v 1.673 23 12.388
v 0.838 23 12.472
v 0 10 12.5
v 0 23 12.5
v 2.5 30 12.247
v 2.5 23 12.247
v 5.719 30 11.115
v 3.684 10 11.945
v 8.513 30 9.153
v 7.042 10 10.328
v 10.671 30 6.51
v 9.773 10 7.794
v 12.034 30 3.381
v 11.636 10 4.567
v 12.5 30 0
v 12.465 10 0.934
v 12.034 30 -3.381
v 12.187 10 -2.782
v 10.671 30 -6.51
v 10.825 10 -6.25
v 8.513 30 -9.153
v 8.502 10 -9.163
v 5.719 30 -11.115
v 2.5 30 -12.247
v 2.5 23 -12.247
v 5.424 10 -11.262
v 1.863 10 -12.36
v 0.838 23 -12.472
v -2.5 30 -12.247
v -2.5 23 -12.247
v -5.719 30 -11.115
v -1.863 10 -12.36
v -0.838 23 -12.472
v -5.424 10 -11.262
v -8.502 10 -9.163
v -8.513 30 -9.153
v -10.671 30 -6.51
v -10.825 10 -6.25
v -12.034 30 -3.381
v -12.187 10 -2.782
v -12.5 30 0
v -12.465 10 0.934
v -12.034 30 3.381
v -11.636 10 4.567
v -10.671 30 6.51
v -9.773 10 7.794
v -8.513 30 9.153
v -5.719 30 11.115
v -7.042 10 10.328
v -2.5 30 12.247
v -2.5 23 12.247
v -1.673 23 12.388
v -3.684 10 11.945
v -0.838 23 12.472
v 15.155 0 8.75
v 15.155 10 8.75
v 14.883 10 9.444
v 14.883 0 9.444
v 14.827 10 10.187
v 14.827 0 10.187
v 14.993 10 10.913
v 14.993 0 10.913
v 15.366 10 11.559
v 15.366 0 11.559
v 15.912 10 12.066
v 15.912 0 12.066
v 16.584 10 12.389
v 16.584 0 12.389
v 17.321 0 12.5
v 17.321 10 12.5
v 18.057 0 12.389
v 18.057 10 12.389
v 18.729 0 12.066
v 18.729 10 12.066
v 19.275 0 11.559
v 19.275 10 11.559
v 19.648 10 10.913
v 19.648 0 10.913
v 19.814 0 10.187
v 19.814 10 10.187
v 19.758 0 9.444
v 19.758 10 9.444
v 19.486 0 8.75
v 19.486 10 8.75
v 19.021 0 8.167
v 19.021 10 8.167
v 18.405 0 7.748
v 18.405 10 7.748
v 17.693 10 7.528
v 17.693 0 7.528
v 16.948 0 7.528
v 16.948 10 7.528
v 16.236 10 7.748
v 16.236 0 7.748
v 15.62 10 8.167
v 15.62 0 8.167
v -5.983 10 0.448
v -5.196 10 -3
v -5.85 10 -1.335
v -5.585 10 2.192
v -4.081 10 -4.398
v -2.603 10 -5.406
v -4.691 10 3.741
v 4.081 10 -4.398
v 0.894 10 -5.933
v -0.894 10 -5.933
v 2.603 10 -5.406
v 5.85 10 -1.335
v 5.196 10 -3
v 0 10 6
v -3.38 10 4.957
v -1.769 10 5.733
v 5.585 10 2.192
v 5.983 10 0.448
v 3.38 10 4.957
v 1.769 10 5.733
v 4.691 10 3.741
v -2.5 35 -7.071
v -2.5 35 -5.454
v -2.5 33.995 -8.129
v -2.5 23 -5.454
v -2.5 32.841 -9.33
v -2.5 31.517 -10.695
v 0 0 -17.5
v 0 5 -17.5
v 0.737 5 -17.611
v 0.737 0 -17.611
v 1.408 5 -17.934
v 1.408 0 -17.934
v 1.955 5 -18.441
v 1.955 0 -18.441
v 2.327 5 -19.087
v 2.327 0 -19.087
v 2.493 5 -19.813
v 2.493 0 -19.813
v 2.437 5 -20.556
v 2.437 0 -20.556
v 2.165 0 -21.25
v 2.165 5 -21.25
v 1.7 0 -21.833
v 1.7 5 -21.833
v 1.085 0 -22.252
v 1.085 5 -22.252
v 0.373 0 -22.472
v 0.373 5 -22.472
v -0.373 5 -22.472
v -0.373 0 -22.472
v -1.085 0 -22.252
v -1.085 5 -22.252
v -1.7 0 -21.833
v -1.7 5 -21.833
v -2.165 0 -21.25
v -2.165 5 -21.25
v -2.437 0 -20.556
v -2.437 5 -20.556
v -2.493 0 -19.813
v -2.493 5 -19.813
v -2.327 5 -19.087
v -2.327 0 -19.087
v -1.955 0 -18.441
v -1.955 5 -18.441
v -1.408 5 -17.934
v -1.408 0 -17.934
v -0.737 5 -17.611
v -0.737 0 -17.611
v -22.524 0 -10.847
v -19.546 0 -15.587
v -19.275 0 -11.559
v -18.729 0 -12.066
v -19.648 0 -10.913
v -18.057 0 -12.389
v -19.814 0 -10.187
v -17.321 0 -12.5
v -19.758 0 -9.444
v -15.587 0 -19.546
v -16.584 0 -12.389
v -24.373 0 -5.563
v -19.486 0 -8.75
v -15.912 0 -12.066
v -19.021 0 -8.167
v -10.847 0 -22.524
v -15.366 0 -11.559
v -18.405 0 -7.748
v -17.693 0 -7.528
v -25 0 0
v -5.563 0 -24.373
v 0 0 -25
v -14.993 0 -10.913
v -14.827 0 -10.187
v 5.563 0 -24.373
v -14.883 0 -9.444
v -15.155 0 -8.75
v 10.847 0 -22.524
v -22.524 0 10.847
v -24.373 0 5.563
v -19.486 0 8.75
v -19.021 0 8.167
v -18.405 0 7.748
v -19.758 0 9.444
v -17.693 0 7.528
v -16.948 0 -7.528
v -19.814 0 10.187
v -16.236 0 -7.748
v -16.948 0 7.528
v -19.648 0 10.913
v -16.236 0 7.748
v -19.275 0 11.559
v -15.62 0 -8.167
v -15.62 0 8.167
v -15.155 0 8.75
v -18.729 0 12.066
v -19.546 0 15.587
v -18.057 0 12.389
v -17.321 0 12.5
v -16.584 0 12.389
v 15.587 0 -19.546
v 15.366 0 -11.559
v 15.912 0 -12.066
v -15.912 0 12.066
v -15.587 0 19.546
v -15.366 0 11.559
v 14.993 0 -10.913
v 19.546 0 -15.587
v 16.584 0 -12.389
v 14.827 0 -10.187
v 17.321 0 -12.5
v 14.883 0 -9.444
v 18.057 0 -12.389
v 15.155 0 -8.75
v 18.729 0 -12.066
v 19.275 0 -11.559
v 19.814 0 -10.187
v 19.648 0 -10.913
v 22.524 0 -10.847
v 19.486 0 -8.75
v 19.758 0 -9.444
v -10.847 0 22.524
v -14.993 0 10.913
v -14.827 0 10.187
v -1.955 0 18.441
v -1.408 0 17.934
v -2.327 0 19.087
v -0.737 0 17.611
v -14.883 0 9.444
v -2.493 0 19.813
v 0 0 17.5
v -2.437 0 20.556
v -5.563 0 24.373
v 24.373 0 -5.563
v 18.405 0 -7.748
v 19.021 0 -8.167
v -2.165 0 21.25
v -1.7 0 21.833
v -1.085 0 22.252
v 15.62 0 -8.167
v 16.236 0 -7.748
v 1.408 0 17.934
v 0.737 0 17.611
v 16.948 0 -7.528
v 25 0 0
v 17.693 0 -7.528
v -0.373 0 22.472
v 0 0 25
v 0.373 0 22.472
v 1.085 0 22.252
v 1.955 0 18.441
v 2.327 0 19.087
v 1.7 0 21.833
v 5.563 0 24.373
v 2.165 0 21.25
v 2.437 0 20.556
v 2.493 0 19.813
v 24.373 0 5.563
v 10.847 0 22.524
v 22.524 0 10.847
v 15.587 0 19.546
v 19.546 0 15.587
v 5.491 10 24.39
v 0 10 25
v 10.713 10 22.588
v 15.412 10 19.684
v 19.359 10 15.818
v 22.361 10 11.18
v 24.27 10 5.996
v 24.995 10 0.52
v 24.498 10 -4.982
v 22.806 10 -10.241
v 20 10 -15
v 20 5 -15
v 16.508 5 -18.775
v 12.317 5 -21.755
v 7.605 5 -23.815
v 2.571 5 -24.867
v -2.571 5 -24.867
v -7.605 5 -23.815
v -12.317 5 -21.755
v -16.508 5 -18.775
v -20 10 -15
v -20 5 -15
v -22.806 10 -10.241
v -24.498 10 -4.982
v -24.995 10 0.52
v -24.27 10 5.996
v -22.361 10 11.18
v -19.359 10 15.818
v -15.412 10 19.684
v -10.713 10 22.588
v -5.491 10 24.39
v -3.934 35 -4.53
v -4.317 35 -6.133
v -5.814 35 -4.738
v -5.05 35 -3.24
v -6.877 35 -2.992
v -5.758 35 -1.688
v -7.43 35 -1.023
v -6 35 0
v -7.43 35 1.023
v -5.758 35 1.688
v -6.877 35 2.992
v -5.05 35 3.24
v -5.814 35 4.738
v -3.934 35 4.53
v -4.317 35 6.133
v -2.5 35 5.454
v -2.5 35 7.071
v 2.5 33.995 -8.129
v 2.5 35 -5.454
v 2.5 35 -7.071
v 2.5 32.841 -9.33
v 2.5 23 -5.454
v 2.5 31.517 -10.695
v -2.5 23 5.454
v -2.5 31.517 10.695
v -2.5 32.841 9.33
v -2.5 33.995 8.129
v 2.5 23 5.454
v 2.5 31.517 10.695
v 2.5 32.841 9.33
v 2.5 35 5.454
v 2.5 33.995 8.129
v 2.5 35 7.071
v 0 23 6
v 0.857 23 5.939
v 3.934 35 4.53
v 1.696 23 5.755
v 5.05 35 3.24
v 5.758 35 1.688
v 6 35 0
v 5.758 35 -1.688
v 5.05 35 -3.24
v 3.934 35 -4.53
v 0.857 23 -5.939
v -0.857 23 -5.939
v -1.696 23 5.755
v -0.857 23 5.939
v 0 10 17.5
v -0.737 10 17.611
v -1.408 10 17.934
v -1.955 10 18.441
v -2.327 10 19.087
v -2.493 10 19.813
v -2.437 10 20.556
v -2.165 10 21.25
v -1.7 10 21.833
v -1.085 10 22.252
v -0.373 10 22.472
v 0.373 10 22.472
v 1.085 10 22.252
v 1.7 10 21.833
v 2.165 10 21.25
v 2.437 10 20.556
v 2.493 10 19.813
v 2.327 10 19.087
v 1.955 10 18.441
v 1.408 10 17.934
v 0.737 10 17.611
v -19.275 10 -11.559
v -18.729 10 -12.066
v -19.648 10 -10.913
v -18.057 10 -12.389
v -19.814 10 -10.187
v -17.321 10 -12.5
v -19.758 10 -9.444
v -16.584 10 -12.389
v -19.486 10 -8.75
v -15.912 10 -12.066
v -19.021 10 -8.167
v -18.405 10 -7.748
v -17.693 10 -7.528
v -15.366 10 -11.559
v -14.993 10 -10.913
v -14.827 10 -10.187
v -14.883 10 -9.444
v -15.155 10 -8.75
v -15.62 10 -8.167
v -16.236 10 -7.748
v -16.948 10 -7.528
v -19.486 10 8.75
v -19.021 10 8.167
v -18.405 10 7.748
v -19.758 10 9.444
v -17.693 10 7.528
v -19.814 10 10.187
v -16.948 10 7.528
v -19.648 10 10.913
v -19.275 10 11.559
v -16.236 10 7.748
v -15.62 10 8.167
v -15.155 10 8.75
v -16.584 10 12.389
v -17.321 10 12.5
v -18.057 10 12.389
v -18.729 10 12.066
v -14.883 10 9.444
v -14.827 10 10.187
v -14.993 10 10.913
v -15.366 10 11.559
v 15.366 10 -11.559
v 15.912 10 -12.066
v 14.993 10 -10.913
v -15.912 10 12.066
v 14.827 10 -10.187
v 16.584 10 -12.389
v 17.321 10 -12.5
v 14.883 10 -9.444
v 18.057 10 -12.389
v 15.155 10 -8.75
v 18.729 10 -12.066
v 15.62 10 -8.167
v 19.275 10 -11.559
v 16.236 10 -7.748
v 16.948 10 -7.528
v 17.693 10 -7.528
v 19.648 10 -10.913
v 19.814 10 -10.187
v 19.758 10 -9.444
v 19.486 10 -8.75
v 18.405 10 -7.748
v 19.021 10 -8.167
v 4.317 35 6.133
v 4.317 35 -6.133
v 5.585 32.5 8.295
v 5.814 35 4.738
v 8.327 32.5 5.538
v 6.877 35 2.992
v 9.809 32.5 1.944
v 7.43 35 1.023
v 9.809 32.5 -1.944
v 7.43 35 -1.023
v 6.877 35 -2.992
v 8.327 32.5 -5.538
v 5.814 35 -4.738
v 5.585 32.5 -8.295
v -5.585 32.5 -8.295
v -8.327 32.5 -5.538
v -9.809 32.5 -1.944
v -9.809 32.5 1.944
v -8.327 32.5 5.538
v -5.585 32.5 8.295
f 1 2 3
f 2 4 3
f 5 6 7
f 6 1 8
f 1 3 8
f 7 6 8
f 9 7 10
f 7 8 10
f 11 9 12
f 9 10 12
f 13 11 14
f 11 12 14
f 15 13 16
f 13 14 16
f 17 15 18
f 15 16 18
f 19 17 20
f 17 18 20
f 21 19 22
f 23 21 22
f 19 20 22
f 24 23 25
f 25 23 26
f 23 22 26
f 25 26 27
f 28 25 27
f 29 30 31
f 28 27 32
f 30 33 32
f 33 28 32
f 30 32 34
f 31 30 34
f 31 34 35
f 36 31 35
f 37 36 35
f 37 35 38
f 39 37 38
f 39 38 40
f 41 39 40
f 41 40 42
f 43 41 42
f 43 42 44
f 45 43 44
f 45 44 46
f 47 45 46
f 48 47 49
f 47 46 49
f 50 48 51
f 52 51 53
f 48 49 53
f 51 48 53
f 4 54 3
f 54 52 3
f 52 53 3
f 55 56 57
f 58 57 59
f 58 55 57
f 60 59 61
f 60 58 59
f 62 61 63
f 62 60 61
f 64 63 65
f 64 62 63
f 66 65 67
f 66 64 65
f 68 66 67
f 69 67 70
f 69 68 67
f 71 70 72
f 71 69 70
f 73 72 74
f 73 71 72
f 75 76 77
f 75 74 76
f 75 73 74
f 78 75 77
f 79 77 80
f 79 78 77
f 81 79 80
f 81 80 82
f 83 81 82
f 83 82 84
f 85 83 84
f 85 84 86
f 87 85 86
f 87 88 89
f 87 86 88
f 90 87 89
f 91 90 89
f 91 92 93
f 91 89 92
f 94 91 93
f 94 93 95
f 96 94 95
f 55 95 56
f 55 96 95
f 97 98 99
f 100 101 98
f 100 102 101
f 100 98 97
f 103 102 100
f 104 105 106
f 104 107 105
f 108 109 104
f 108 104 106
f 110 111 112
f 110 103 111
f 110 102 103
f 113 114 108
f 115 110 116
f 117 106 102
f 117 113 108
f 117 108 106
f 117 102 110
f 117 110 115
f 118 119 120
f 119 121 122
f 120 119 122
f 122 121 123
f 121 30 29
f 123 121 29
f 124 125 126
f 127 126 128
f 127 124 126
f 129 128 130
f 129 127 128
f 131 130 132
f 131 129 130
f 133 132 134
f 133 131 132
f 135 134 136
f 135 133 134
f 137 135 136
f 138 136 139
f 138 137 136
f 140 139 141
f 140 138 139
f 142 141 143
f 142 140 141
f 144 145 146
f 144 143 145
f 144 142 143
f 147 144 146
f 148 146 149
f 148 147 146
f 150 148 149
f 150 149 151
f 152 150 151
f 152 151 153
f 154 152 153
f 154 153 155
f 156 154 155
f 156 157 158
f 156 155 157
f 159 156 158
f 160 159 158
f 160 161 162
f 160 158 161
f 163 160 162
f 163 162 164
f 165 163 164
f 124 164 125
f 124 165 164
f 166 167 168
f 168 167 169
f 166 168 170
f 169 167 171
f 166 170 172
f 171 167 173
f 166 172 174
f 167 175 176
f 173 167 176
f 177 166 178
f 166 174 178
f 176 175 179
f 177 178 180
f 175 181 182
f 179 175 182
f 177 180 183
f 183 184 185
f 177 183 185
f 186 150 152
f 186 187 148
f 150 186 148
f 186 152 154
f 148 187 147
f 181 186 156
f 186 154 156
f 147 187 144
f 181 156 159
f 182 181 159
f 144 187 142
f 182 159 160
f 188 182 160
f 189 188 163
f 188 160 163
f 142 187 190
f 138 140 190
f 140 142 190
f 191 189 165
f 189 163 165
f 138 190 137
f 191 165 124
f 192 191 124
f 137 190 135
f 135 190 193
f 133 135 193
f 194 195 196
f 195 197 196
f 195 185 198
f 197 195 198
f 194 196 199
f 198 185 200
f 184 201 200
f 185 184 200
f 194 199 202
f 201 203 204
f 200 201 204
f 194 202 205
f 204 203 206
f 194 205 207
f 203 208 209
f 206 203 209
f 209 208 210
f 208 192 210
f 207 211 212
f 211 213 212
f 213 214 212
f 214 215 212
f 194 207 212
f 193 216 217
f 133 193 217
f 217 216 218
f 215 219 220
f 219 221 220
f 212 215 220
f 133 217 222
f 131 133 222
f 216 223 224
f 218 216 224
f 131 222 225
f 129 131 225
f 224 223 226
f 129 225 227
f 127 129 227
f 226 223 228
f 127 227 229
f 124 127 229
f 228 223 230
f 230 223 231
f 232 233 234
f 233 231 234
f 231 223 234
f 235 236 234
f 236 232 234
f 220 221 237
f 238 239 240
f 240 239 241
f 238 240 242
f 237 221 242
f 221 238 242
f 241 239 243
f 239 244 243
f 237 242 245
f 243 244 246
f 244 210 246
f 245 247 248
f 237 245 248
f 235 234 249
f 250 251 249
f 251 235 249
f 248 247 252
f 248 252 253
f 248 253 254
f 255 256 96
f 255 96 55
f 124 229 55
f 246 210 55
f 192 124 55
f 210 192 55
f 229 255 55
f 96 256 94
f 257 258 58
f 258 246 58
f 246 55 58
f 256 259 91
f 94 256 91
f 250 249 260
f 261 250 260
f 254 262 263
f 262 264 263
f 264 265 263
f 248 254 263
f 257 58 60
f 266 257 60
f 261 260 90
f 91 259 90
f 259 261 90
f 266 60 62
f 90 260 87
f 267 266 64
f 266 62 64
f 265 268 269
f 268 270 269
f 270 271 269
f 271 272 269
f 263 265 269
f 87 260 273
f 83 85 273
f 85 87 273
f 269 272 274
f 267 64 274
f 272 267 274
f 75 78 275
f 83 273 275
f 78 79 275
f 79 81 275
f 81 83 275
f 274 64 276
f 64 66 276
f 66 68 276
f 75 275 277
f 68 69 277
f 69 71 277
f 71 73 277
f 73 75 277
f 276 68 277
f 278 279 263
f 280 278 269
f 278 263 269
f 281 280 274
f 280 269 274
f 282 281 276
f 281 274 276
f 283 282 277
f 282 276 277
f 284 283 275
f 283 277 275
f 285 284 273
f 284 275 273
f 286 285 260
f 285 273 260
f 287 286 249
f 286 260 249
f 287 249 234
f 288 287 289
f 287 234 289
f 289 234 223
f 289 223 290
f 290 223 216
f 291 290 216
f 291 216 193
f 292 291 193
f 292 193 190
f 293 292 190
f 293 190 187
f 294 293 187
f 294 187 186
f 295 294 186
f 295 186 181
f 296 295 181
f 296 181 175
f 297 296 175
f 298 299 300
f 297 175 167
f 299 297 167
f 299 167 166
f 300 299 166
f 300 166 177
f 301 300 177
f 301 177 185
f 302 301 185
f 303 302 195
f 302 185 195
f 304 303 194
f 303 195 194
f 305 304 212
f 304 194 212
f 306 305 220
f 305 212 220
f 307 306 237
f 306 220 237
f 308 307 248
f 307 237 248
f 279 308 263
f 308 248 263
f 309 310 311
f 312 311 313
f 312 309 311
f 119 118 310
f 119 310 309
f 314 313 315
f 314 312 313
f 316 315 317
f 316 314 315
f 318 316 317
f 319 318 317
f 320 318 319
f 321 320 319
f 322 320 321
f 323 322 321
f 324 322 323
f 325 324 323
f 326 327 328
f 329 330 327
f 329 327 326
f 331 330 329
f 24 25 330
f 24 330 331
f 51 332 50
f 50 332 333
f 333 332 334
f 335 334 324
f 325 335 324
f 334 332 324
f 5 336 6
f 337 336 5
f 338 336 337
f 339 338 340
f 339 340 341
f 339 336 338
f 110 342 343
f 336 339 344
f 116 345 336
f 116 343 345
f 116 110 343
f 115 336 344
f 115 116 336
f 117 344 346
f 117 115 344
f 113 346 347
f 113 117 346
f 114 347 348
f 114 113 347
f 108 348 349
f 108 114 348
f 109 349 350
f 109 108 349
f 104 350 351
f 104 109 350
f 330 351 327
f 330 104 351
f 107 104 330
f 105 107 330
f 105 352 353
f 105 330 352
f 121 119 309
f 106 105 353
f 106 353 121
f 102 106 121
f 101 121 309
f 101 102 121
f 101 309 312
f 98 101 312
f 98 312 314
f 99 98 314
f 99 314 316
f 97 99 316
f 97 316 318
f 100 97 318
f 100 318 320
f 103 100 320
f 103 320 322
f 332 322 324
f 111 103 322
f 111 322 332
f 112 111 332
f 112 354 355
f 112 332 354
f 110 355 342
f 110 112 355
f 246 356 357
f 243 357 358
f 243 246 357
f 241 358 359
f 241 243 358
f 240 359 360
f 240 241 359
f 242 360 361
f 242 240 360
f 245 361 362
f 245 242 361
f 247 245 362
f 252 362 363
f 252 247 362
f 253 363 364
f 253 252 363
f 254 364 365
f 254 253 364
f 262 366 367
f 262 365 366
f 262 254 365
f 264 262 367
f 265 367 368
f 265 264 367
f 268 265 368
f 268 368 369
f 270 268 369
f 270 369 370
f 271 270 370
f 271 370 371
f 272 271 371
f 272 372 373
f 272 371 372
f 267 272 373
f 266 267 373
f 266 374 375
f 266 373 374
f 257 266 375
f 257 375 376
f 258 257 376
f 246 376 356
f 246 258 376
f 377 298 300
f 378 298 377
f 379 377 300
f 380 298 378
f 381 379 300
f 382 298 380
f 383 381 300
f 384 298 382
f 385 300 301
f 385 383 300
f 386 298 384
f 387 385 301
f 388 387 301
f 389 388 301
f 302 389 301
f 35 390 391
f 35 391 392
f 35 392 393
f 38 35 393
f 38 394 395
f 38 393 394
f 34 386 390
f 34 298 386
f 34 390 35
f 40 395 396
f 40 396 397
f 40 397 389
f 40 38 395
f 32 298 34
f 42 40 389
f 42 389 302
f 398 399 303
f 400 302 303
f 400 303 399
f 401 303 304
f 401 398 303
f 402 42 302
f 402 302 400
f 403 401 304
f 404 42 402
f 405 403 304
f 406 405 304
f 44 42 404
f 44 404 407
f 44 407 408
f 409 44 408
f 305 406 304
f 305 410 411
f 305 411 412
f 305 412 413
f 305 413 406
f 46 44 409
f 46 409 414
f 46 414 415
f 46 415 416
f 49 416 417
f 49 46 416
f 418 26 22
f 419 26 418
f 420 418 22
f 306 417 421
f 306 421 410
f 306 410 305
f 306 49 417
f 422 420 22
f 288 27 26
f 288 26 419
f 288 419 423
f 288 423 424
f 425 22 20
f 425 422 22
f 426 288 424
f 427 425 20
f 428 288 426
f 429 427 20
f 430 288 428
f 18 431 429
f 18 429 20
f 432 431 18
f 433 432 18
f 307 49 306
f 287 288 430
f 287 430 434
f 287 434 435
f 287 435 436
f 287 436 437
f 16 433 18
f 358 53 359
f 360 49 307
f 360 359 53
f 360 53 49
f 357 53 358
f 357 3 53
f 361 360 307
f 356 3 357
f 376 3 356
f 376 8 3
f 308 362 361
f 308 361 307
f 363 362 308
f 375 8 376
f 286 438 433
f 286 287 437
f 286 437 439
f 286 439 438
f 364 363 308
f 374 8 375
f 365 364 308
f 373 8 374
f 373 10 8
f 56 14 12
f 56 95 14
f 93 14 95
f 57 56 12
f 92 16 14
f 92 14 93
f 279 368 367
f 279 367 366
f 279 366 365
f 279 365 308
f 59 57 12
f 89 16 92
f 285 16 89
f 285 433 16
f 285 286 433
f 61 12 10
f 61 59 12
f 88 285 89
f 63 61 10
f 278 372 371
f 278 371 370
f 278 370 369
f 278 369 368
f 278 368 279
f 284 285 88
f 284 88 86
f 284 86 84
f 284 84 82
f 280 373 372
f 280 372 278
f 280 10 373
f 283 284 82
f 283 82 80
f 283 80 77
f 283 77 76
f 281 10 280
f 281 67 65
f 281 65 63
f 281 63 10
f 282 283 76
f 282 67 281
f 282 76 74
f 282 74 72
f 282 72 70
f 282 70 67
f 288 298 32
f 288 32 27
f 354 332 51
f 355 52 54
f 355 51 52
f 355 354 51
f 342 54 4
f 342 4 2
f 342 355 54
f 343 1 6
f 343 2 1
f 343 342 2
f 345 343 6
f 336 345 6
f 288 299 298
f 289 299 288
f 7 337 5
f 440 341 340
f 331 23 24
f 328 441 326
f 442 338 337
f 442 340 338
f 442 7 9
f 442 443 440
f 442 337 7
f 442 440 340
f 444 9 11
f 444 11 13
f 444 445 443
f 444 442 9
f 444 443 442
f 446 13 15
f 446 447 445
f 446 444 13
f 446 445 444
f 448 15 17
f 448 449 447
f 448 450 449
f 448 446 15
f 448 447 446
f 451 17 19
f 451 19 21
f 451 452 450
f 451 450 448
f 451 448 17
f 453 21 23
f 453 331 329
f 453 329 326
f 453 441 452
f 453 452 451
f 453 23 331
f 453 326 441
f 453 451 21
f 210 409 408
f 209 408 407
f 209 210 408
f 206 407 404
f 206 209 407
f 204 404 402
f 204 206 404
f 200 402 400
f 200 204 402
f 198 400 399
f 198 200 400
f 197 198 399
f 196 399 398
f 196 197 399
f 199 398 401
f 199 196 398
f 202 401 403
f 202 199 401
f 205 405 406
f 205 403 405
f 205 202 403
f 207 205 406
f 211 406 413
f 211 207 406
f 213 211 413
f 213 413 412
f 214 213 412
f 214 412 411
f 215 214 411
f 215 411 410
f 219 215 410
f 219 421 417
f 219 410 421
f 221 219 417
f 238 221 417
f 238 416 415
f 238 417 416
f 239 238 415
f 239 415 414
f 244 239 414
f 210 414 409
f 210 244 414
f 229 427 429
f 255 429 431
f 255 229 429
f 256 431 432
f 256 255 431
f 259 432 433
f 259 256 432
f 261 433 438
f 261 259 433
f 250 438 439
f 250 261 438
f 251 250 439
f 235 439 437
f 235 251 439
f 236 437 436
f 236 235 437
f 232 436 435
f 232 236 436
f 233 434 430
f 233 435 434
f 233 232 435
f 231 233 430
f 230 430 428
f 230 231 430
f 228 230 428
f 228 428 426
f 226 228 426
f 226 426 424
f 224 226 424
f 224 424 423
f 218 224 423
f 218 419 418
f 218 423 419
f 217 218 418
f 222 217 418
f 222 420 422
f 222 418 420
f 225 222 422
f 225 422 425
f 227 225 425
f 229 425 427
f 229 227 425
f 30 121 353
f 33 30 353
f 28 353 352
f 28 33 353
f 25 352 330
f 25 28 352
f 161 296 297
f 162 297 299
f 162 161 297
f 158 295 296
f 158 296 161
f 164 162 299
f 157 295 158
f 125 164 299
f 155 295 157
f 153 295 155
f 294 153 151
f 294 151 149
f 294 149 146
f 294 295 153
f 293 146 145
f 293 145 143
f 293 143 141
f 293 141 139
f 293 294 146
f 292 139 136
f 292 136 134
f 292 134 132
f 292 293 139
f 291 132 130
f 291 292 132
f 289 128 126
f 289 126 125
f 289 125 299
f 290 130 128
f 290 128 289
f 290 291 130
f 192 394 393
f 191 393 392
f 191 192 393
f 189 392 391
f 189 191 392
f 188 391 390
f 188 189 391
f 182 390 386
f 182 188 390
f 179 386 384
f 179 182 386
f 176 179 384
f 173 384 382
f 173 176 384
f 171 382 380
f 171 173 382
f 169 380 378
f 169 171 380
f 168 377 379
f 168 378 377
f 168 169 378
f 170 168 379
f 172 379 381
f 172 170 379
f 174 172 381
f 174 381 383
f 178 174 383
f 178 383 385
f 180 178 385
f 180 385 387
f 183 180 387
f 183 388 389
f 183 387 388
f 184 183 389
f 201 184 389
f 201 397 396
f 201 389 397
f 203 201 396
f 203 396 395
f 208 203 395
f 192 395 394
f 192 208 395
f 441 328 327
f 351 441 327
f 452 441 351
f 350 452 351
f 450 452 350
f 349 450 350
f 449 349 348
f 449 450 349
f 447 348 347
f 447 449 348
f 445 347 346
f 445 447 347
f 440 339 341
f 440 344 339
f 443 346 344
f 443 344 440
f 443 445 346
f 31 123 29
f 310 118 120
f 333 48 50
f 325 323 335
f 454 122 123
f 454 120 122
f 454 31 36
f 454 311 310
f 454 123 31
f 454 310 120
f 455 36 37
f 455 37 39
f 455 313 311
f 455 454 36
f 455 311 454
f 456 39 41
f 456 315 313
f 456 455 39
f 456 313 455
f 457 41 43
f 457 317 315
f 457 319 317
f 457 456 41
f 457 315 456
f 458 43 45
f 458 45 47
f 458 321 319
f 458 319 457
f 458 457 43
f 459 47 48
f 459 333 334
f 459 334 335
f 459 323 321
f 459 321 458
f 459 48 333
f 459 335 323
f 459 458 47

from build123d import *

# Parameters (mm, degrees)
SKETCH1_R               = 25
BOSS_EXTRUDE1_DEPTH     = 10
SKETCH1_3_R             = 12.5
SKETCH1_3_R_2           = 6
BOSS_EXTRUDE2_DEPTH     = 35
CUT_EXTRUDE1_START      = 5
CUT_EXTRUDE1_DEPTH      = 5
CUT_EXTRUDE2_DEPTH      = 50.749371855
CUT_EXTRUDE2_DEPTH_BACK = 50.749371855
SKETCH2_W               = 5
SKETCH2_H               = 12
SKETCH3_R               = 2.5
CUT_EXTRUDE3_DEPTH      = 50.749371855
CIRPATTERN1_COUNT       = 6
CHAMFER1_SIZE           = 5


with BuildPart() as part:
    # Sketch1 → Boss-Extrude1 (new body)
    with BuildSketch(Plane(origin=(0, 0, 0), x_dir=(1, 0, 0), z_dir=(0, 1, 0))):
        with Locations(Location((0, 0, 0), (0, 0, 270))):
            Circle(SKETCH1_R)
    extrude(amount=BOSS_EXTRUDE1_DEPTH)

    # Sketch1<3> → Boss-Extrude2 (add)
    with BuildSketch(Plane(origin=(0, 0, 0), x_dir=(1, 0, 0), z_dir=(0, 1, 0))):
        with Locations(Location((0, 0, 0), (0, 0, 270))):
            Circle(SKETCH1_3_R)
        with Locations(Location((0, 0, 0), (0, 0, 270))):
            Circle(SKETCH1_3_R_2, mode=Mode.SUBTRACT)
    extrude(amount=BOSS_EXTRUDE2_DEPTH)

    # Sketch1<5> → Cut-Extrude1 (cut)
    with BuildSketch(Plane(origin=(0, 0, 0), x_dir=(1, 0, 0), z_dir=(0, 1, 0)).offset(CUT_EXTRUDE1_START)):
        with BuildLine():
            ThreePointArc((20, 15), (0, 25), (-20, 15))
            Line((-20, 15), (20, 15))
        make_face()
    extrude(amount=CUT_EXTRUDE1_DEPTH, mode=Mode.SUBTRACT)

    # Sketch2 → Cut-Extrude2 (cut, two sides: drawn at the far end of the back side and taken through both)
    with BuildSketch(Plane.XY.offset(-CUT_EXTRUDE2_DEPTH_BACK)):
        with Locations((0, 29)):
            Rectangle(SKETCH2_W, SKETCH2_H)
    extrude(amount=CUT_EXTRUDE2_DEPTH + CUT_EXTRUDE2_DEPTH_BACK, mode=Mode.SUBTRACT)

    # Sketch3 → Cut-Extrude3 (cut, through all)
    with BuildSketch(Plane(origin=(0, 0, 0), x_dir=(1, 0, 0), z_dir=(0, 1, 0))):
        with Locations(Location((0, 20, 0), (0, 0, 270))):
            Circle(SKETCH3_R)
    cut_extrude3 = extrude(amount=CUT_EXTRUDE3_DEPTH, mode=Mode.SUBTRACT)

    # CirPattern1: Cut-Extrude3 ×6 about axis
    cirpattern1_axis = Axis((0, 0, 0), (0, 1, 0))
    for i in range(1, CIRPATTERN1_COUNT):
        add(cut_extrude3.rotate(cirpattern1_axis, i * 360 / CIRPATTERN1_COUNT), mode=Mode.SUBTRACT)

    # Chamfer1
    chamfer1_edges = [part.edges().sort_by_distance(p)[0] for p in [
        (-12.5, 35, 0),
        (12.5, 35, 0),
    ]]
    chamfer(chamfer1_edges, length=CHAMFER1_SIZE)


solid = part.part
